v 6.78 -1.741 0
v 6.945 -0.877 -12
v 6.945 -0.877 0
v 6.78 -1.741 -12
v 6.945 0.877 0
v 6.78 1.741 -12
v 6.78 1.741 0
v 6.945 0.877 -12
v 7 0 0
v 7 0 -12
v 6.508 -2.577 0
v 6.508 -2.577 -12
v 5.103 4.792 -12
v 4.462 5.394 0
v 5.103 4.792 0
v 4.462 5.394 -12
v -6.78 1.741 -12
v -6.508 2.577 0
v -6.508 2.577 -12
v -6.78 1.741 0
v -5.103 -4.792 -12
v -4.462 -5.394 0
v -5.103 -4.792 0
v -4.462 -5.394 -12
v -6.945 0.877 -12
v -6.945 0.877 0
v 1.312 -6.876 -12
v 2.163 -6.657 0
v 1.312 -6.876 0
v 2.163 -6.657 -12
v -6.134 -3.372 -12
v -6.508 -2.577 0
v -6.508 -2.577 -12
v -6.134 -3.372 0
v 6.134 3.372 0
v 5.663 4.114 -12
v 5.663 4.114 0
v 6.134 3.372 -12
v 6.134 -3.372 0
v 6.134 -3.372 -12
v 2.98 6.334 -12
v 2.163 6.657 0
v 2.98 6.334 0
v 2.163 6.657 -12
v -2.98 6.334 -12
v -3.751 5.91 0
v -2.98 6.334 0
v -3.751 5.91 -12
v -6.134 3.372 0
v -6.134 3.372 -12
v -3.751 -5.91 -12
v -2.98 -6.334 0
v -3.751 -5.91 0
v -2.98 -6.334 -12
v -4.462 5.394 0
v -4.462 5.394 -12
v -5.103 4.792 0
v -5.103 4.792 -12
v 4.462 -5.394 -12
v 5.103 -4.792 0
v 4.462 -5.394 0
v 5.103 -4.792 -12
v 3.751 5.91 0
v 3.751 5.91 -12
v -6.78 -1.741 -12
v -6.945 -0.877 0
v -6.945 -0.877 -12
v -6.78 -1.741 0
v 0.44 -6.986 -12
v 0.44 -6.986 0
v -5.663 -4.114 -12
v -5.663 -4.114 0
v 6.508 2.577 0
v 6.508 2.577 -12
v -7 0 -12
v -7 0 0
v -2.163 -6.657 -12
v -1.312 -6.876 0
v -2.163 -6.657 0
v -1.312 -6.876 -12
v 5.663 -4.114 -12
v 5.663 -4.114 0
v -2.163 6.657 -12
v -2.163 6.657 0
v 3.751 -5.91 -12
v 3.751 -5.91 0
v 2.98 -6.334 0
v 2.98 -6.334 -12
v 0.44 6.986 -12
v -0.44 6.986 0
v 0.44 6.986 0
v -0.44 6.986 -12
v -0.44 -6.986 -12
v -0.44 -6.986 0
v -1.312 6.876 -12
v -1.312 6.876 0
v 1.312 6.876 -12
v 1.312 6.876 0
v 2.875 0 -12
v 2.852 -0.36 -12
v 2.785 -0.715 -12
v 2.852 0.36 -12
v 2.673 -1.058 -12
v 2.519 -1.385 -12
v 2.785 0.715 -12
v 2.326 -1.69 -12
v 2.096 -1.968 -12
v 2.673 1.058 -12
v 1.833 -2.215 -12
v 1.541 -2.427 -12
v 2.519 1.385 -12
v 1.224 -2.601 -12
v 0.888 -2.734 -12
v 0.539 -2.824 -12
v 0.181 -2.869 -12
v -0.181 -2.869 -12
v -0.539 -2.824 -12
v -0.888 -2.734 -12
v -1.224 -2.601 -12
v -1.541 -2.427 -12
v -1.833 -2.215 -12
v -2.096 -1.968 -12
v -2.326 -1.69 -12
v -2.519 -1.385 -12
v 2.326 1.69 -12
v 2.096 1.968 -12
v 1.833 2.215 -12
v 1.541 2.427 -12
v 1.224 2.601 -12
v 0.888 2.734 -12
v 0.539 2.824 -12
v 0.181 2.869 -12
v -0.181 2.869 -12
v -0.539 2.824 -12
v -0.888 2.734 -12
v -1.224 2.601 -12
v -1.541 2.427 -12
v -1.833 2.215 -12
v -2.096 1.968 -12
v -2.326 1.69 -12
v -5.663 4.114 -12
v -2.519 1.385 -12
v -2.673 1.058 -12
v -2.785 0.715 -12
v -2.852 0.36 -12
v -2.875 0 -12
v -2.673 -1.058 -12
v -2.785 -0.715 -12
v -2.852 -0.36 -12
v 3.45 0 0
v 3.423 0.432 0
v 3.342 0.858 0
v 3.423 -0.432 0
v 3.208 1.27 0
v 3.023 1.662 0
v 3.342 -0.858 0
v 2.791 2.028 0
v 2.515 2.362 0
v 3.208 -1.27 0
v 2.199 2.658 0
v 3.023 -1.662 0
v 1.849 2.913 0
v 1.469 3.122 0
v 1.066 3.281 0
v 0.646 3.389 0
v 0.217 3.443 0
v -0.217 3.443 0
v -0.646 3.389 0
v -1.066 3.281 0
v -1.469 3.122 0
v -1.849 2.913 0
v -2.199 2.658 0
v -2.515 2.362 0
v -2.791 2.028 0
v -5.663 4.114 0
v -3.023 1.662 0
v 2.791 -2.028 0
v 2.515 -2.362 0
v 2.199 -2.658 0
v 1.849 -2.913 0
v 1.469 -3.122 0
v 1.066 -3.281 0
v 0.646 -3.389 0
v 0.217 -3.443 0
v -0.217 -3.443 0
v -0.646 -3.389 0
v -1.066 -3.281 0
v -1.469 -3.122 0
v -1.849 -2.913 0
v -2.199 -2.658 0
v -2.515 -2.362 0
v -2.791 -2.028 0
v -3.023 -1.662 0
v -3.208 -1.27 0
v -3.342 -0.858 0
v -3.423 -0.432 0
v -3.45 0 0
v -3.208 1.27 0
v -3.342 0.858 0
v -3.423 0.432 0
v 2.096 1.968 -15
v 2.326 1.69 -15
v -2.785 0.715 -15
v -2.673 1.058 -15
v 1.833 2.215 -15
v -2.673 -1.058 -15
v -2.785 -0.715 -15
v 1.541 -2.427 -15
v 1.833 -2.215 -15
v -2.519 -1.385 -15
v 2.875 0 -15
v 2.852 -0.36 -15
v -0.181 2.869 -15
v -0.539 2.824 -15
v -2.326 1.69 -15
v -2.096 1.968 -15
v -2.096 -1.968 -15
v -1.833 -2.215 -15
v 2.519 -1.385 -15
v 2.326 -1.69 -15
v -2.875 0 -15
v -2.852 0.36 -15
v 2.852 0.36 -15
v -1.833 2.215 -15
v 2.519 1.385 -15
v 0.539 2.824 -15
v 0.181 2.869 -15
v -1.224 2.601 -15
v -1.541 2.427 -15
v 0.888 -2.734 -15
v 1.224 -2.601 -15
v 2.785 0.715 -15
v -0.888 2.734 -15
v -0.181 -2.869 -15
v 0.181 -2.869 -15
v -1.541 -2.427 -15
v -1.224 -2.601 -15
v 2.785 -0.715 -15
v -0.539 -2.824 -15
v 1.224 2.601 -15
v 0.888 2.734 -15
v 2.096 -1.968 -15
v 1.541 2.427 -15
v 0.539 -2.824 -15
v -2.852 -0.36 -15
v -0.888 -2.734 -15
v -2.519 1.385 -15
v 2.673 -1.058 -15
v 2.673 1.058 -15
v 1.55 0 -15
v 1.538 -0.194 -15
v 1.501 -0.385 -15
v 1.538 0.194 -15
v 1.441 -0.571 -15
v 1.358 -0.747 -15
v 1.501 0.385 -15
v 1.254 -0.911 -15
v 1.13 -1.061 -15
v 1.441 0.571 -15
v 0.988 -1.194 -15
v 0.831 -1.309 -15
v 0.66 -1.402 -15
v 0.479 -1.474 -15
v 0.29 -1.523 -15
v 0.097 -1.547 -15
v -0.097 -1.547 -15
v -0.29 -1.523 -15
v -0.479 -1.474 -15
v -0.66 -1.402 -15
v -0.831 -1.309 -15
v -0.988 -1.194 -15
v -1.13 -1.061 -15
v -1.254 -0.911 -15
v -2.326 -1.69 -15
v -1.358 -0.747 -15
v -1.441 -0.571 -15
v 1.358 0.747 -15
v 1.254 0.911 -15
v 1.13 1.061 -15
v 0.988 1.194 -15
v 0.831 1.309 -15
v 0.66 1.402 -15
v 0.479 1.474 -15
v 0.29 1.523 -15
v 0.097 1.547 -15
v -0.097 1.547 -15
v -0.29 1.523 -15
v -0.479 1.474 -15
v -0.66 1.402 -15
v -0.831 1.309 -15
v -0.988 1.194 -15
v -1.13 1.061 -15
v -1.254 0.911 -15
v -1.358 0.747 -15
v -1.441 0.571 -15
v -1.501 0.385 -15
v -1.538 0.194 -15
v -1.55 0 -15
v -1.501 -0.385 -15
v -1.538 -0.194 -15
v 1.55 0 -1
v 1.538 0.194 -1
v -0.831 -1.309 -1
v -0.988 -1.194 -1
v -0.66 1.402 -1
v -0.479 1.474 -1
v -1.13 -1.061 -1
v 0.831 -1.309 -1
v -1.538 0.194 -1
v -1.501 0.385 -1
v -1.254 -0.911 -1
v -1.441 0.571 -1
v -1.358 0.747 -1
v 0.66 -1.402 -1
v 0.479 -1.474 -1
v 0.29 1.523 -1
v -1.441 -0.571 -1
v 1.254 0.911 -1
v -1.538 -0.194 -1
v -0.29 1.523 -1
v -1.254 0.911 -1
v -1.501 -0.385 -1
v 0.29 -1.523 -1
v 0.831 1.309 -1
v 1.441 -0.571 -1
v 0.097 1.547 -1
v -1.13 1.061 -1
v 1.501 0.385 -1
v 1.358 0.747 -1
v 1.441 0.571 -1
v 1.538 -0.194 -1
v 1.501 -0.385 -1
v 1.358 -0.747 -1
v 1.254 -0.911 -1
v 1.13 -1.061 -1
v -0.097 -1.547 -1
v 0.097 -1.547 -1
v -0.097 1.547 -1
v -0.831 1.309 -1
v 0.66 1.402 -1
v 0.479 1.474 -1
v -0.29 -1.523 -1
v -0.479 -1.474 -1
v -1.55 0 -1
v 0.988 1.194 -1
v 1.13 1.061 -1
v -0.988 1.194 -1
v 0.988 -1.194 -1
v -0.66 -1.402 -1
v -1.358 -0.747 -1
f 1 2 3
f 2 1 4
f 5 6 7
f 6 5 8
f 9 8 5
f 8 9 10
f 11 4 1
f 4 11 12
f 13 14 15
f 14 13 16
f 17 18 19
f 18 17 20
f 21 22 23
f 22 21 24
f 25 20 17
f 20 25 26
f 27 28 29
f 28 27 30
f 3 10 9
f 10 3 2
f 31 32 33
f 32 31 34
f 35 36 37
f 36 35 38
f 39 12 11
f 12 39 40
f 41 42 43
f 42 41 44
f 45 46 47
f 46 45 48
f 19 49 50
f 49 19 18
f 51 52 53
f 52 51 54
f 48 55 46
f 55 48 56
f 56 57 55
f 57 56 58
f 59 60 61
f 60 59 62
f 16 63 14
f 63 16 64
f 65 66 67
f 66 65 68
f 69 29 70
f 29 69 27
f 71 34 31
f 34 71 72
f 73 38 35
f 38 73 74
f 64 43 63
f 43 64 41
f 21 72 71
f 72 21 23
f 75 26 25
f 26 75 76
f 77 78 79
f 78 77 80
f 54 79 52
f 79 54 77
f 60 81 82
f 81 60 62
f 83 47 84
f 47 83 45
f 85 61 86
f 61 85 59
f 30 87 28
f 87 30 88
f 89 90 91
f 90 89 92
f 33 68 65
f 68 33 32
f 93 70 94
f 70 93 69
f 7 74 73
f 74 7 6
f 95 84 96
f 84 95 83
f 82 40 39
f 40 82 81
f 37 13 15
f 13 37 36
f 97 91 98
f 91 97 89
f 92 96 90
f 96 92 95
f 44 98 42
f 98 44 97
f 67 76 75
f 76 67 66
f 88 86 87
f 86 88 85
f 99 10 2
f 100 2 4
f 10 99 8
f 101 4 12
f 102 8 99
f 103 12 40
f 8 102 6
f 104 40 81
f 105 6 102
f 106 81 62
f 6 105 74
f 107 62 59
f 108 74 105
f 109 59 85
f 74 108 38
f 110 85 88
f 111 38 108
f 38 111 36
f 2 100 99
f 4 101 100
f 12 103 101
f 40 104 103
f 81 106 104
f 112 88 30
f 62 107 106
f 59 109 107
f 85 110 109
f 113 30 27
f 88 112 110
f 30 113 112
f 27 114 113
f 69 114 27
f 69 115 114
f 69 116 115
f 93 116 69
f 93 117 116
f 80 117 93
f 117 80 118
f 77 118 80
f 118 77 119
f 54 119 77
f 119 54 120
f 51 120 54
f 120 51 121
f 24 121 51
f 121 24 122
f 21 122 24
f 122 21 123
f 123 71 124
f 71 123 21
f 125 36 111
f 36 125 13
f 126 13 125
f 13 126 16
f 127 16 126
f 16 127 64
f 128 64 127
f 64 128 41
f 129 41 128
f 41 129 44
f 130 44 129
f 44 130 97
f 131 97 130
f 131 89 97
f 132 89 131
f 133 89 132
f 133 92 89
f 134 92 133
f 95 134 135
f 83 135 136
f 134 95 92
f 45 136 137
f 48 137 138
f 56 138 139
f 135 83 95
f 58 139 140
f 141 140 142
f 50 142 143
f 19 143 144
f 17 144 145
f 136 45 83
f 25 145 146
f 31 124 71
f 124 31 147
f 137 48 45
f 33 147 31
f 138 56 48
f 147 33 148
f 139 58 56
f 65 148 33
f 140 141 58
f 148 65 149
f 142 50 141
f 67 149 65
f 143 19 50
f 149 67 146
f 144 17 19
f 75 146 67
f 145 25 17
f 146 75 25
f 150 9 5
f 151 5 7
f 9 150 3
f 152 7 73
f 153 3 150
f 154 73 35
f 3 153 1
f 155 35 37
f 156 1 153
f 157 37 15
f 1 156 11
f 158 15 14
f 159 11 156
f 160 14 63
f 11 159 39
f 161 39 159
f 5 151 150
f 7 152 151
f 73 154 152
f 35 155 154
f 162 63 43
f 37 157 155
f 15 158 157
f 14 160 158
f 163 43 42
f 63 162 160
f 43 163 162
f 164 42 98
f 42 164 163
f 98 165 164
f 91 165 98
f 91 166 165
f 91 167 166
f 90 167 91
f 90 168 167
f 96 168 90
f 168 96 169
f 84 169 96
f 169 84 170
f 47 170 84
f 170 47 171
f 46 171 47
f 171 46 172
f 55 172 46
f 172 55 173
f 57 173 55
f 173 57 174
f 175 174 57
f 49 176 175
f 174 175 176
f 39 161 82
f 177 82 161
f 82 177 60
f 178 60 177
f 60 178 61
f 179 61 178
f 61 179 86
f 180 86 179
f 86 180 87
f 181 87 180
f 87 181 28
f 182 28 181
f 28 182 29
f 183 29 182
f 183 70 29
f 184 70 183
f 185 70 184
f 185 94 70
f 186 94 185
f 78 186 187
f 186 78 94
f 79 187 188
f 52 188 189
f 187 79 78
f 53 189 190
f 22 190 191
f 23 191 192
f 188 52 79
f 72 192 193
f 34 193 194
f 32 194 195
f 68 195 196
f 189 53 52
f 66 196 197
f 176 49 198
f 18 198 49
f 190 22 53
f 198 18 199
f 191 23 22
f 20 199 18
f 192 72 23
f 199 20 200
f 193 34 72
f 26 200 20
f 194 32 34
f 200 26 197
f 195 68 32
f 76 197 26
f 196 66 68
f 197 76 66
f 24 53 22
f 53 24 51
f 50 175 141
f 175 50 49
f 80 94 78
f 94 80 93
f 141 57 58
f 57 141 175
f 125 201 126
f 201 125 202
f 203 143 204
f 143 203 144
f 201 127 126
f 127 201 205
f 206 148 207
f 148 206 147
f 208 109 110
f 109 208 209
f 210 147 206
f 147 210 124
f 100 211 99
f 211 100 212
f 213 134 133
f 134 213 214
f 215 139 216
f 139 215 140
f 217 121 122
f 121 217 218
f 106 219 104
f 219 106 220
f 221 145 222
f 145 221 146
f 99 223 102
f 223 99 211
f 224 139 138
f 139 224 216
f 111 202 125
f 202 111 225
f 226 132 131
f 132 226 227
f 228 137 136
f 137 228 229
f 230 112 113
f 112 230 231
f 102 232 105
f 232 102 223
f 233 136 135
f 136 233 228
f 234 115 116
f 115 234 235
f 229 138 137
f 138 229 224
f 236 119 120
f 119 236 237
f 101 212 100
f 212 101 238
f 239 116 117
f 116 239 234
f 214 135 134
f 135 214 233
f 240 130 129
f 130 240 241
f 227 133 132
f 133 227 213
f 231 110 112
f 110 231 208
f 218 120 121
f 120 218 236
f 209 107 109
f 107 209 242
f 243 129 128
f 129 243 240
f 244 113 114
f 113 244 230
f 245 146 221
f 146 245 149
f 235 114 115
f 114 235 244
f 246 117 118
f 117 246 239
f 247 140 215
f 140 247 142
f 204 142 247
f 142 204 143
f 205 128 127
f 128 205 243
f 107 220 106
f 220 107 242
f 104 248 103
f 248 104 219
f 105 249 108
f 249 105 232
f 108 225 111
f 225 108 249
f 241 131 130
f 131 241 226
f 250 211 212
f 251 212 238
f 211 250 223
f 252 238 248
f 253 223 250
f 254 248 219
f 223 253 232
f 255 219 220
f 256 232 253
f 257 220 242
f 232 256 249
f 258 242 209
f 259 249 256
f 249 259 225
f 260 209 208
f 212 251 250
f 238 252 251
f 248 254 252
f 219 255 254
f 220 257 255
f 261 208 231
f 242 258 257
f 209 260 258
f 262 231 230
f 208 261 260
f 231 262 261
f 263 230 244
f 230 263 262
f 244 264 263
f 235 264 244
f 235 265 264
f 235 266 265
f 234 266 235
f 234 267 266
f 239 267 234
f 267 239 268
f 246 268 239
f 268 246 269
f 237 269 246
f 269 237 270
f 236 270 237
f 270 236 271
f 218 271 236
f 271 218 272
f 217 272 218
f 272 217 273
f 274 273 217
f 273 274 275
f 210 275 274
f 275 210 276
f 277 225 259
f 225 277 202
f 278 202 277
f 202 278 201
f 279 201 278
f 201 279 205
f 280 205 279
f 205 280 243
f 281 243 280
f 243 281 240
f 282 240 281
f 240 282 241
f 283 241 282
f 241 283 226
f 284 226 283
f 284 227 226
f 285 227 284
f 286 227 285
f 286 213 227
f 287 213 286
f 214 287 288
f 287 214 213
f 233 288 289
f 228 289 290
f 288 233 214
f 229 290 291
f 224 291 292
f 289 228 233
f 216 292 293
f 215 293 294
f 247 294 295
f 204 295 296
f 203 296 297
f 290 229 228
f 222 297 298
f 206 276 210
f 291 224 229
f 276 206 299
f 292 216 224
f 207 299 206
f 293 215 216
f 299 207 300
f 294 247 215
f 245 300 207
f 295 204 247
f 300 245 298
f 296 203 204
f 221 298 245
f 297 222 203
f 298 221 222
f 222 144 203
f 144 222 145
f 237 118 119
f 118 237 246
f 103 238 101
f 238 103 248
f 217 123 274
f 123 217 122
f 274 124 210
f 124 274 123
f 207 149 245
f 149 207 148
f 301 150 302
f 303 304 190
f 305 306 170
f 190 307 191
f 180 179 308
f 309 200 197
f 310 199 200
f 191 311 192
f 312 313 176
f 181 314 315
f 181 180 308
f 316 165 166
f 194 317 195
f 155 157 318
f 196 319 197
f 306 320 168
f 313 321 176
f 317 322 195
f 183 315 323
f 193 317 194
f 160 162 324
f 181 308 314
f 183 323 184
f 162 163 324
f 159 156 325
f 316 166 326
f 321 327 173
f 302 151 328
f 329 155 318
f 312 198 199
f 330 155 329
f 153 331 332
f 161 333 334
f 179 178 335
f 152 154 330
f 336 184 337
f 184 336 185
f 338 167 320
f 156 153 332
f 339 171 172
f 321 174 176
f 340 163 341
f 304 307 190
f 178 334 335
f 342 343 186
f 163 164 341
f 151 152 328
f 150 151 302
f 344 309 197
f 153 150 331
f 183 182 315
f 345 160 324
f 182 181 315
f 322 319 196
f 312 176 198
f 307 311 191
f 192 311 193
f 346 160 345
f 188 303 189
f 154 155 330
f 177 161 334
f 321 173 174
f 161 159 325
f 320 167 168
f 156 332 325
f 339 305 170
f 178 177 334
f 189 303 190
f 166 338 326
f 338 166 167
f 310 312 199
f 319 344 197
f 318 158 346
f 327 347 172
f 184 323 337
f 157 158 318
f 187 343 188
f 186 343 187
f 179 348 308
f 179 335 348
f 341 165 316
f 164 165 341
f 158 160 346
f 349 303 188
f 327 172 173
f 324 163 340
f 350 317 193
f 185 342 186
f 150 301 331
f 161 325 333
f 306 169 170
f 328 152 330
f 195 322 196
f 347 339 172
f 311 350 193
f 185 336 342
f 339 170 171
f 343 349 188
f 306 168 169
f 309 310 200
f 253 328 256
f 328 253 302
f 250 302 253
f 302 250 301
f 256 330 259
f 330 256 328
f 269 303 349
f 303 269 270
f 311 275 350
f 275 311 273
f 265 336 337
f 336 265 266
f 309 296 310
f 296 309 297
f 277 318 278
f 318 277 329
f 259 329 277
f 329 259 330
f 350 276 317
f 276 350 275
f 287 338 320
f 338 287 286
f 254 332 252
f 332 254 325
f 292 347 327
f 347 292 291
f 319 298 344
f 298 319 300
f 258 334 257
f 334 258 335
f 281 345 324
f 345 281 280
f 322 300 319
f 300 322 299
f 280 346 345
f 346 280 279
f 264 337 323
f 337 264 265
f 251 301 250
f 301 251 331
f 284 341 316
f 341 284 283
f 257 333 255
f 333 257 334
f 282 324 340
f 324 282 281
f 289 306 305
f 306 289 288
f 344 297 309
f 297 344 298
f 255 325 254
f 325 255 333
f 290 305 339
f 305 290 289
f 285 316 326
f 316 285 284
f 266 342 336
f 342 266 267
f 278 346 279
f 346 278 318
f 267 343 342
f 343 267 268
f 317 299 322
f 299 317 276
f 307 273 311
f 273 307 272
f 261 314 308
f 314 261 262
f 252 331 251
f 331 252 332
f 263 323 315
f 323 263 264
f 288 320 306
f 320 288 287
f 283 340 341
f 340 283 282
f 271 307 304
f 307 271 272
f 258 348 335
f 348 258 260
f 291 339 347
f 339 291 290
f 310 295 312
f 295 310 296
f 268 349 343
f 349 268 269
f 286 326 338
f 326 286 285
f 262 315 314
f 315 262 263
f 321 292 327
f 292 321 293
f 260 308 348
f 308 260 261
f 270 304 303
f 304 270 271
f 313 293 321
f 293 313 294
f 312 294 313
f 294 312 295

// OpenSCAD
$fn = 50;

difference() {
	union() {
		translate(v = [0, 0, -12.0]) {
			cylinder(h = 12, r = 7.0);
		}
		#translate(v = [0, 0, -15.0]) {
			cylinder(h = 15, r = 2.875);
		}
	}
	union() {
		translate(v = [0, 0, 0]) {
			rotate(a = [0, 0, 0]) {
				difference() {
					union() {
						translate(v = [0, 0, -15.0]) {
							cylinder(h = 15, r = 1.25);
						}
						translate(v = [0, 0, -1.0]) {
							cylinder(h = 1.0, r1 = 1.55, r2 = 3.45);
						}
						translate(v = [0, 0, -15.0]) {
							cylinder(h = 15, r = 1.55);
						}
						translate(v = [0, 0, -15.0]) {
							cylinder(h = 15, r = 1.25);
						}
					}
					union();
				}
			}
		}
	}
}
